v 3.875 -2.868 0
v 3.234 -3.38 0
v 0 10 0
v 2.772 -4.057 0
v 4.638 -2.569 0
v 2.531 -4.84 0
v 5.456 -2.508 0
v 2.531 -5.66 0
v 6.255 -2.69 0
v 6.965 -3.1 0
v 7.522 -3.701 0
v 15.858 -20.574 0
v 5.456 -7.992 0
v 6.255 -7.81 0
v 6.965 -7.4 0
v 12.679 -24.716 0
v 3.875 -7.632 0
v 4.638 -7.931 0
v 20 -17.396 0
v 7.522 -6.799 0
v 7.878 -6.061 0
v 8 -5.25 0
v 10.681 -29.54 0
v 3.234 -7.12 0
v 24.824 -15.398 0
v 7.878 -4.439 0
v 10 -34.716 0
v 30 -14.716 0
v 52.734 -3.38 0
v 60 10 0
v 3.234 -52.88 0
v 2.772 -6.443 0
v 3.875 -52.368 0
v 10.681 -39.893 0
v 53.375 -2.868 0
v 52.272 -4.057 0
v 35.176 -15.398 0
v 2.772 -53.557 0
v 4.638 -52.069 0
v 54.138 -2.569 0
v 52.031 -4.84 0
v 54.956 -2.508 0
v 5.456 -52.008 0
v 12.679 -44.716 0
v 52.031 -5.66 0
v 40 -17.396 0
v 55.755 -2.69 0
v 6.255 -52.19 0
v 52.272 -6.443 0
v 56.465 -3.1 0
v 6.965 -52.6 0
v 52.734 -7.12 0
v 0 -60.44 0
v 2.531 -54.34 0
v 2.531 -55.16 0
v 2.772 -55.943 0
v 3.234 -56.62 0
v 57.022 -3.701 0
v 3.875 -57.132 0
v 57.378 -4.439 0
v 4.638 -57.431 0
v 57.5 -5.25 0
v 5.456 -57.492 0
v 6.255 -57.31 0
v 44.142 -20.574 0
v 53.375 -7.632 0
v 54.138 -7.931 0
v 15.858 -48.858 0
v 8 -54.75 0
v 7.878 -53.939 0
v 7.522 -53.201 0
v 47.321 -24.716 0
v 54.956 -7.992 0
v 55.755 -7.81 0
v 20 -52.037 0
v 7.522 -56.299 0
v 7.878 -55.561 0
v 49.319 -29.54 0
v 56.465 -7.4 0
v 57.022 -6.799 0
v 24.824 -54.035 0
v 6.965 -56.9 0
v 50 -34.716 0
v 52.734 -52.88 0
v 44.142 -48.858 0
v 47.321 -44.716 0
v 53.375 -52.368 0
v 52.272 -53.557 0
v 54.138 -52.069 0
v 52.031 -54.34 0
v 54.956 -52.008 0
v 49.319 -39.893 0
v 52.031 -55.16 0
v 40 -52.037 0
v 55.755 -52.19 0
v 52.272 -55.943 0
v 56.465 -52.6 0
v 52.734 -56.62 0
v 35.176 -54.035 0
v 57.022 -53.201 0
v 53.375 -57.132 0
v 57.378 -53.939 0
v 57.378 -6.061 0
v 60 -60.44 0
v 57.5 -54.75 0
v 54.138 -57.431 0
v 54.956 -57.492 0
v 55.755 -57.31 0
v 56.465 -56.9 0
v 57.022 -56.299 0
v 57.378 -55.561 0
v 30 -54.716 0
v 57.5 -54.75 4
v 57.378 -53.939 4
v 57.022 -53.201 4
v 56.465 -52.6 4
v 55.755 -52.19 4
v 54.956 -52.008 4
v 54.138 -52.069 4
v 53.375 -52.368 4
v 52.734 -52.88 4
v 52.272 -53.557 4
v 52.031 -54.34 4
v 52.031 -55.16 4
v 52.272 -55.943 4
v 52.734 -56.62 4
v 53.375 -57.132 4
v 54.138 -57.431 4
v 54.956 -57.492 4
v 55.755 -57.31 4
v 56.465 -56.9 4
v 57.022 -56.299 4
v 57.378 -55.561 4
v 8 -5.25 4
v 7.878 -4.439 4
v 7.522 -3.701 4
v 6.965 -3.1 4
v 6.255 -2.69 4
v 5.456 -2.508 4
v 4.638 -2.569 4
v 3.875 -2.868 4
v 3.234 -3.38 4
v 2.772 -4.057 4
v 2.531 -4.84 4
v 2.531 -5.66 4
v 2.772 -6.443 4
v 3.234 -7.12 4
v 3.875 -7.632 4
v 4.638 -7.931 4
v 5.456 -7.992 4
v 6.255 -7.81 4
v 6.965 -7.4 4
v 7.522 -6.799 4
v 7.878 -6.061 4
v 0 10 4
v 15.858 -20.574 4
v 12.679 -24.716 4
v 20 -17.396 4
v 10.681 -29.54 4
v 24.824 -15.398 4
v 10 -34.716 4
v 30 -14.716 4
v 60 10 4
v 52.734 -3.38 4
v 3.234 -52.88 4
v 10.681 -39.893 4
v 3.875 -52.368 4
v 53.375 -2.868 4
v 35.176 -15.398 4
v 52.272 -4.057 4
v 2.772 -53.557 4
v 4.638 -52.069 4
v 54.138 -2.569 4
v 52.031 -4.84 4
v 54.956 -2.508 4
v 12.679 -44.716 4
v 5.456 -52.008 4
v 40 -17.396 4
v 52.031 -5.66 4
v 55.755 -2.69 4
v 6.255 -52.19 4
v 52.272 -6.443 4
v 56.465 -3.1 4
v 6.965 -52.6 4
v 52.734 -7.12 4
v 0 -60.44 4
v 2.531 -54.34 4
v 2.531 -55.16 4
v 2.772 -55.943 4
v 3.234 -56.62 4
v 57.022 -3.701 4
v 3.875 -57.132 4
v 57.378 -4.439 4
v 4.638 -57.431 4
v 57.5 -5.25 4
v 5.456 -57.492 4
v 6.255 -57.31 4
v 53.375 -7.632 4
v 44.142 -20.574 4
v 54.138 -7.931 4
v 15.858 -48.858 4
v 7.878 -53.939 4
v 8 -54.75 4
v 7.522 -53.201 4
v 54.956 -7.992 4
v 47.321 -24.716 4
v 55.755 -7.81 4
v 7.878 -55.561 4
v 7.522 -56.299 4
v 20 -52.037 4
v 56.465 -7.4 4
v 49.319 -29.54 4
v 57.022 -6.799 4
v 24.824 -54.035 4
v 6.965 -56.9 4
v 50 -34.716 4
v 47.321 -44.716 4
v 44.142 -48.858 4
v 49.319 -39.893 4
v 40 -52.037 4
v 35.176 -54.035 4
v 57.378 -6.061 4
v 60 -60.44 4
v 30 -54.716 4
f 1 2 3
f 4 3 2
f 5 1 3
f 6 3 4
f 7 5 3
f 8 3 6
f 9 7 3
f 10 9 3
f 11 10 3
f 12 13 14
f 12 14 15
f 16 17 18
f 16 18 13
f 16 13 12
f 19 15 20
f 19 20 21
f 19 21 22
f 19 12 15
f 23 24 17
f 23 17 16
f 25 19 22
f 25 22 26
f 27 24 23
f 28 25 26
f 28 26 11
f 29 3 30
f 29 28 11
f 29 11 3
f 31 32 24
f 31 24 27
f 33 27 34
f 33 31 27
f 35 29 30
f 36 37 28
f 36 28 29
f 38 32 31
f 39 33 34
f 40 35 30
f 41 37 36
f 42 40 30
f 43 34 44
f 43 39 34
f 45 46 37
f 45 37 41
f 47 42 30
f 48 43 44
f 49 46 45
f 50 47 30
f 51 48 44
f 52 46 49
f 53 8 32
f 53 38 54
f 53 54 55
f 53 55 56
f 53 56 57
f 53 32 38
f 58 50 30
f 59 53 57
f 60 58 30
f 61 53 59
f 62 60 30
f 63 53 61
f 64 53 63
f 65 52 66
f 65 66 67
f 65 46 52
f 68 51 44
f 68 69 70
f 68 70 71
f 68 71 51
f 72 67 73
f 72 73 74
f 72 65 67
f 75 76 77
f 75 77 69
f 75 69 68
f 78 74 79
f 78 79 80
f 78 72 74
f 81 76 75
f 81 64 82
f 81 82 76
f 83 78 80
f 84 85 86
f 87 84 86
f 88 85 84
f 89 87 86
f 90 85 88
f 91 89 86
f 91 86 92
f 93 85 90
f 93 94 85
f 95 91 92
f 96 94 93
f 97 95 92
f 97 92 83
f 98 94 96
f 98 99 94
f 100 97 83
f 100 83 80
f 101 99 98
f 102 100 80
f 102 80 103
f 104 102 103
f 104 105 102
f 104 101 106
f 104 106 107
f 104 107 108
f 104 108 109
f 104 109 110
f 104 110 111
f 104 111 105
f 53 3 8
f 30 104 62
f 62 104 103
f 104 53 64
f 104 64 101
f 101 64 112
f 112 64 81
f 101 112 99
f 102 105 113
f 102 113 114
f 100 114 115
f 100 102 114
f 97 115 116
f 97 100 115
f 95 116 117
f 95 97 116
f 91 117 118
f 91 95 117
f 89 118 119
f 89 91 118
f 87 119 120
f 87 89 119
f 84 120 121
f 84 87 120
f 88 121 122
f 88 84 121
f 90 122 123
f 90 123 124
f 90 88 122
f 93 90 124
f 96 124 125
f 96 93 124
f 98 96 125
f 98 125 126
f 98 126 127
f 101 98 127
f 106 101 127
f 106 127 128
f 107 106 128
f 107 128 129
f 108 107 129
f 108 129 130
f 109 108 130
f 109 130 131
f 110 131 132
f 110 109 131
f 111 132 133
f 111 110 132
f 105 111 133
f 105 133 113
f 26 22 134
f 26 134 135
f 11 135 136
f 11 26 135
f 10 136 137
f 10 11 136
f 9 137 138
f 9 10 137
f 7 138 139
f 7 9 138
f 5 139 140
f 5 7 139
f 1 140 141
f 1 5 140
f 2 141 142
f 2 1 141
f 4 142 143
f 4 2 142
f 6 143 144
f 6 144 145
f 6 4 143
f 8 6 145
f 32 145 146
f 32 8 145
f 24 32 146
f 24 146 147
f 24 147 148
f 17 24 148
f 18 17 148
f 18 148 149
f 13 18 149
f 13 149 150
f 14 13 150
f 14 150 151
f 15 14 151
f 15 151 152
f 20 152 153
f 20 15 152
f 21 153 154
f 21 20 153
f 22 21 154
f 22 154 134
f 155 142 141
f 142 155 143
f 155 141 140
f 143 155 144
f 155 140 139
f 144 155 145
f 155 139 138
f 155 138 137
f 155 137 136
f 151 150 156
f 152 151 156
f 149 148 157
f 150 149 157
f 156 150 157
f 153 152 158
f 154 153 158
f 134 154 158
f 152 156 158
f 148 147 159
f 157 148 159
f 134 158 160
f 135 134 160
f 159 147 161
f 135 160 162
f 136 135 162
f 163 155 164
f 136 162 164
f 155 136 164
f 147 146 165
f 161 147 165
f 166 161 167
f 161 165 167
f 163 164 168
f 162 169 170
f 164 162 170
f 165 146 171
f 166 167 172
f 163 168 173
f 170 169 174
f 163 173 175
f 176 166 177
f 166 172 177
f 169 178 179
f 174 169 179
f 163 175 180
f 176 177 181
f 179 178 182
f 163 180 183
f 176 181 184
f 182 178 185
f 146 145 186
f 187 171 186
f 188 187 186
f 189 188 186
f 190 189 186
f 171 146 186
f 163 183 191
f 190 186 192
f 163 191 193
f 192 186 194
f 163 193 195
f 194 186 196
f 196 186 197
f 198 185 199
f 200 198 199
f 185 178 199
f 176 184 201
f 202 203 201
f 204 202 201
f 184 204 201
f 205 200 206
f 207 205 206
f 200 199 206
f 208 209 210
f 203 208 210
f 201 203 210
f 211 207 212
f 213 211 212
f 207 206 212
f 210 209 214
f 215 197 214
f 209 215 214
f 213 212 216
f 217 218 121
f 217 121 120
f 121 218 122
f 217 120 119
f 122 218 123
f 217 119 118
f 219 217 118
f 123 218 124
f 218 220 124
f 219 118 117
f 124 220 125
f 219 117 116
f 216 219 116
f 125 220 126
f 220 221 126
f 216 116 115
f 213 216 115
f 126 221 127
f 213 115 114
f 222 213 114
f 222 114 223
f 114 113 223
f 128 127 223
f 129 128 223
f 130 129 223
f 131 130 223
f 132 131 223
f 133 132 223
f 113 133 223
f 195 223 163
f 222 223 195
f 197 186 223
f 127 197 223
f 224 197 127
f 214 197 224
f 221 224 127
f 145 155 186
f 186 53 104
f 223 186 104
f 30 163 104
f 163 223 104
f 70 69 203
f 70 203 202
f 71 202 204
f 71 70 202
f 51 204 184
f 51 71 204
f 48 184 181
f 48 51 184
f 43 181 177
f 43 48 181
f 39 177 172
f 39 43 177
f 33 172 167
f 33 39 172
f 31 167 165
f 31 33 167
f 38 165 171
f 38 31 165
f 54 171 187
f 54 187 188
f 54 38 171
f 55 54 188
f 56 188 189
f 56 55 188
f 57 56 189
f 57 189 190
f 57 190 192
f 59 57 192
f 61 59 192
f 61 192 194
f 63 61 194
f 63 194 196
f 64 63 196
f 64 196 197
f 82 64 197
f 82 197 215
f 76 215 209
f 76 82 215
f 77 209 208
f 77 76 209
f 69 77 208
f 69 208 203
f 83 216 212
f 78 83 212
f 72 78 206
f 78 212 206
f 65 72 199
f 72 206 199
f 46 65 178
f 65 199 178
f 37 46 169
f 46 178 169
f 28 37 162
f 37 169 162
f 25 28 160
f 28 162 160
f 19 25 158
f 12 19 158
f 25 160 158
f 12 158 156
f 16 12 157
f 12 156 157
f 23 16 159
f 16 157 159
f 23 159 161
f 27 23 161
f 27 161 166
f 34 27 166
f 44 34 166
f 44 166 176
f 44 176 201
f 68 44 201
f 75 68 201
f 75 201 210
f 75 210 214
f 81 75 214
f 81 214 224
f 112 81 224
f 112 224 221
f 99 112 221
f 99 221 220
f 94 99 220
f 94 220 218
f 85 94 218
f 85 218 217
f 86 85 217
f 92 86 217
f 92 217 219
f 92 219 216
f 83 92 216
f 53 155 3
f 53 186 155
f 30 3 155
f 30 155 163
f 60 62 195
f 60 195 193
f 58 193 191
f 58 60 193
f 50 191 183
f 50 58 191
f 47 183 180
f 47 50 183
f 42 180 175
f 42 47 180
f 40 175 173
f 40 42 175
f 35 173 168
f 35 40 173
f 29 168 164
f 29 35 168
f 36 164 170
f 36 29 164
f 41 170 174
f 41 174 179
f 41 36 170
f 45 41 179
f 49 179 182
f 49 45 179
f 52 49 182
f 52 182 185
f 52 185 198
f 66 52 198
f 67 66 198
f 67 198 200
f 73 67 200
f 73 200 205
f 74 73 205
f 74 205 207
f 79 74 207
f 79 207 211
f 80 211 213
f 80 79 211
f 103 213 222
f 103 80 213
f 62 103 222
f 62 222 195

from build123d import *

# Parameters (mm, degrees)
SKETCH_1_W          = 60
SKETCH_1_H          = 60.44
SKETCH_1_R          = 2.75
EXTRUDE_1_DEPTH     = 4
SKETCH_3_R          = 20
CUT_EXTRUDE_1_DEPTH = 5
SKETCH_6_W          = 60
SKETCH_6_H          = 4
EXTRUDE_2_DEPTH     = 10


with BuildPart() as part:
    # 草圖1 → 填料-伸長1 (new body)
    with BuildSketch(Plane.XY):
        with Locations((30, -30.22)):
            Rectangle(SKETCH_1_W, SKETCH_1_H)
        with Locations((5.25, -5.25)):
            Circle(SKETCH_1_R, mode=Mode.SUBTRACT)
        with Locations((54.75, -5.25)):
            Circle(SKETCH_1_R, mode=Mode.SUBTRACT)
        with Locations((5.25, -54.75)):
            Circle(SKETCH_1_R, mode=Mode.SUBTRACT)
        with Locations((54.75, -54.75)):
            Circle(SKETCH_1_R, mode=Mode.SUBTRACT)
    extrude(amount=EXTRUDE_1_DEPTH)

    # 草圖3 → 除料-伸長1 (cut, through all)
    with BuildSketch(Plane.XY.offset(4)):
        with Locations((30, -34.716194978)):
            Circle(SKETCH_3_R)
    extrude(amount=-CUT_EXTRUDE_1_DEPTH, mode=Mode.SUBTRACT)

    # 草圖6 → 填料-伸長2 (add)
    with BuildSketch(Plane(origin=(0, 0, 0), x_dir=(1, 0, 0), z_dir=(0, 1, 0))):
        with Locations((30, -2)):
            Rectangle(SKETCH_6_W, SKETCH_6_H)
    extrude(amount=EXTRUDE_2_DEPTH)


solid = part.part
